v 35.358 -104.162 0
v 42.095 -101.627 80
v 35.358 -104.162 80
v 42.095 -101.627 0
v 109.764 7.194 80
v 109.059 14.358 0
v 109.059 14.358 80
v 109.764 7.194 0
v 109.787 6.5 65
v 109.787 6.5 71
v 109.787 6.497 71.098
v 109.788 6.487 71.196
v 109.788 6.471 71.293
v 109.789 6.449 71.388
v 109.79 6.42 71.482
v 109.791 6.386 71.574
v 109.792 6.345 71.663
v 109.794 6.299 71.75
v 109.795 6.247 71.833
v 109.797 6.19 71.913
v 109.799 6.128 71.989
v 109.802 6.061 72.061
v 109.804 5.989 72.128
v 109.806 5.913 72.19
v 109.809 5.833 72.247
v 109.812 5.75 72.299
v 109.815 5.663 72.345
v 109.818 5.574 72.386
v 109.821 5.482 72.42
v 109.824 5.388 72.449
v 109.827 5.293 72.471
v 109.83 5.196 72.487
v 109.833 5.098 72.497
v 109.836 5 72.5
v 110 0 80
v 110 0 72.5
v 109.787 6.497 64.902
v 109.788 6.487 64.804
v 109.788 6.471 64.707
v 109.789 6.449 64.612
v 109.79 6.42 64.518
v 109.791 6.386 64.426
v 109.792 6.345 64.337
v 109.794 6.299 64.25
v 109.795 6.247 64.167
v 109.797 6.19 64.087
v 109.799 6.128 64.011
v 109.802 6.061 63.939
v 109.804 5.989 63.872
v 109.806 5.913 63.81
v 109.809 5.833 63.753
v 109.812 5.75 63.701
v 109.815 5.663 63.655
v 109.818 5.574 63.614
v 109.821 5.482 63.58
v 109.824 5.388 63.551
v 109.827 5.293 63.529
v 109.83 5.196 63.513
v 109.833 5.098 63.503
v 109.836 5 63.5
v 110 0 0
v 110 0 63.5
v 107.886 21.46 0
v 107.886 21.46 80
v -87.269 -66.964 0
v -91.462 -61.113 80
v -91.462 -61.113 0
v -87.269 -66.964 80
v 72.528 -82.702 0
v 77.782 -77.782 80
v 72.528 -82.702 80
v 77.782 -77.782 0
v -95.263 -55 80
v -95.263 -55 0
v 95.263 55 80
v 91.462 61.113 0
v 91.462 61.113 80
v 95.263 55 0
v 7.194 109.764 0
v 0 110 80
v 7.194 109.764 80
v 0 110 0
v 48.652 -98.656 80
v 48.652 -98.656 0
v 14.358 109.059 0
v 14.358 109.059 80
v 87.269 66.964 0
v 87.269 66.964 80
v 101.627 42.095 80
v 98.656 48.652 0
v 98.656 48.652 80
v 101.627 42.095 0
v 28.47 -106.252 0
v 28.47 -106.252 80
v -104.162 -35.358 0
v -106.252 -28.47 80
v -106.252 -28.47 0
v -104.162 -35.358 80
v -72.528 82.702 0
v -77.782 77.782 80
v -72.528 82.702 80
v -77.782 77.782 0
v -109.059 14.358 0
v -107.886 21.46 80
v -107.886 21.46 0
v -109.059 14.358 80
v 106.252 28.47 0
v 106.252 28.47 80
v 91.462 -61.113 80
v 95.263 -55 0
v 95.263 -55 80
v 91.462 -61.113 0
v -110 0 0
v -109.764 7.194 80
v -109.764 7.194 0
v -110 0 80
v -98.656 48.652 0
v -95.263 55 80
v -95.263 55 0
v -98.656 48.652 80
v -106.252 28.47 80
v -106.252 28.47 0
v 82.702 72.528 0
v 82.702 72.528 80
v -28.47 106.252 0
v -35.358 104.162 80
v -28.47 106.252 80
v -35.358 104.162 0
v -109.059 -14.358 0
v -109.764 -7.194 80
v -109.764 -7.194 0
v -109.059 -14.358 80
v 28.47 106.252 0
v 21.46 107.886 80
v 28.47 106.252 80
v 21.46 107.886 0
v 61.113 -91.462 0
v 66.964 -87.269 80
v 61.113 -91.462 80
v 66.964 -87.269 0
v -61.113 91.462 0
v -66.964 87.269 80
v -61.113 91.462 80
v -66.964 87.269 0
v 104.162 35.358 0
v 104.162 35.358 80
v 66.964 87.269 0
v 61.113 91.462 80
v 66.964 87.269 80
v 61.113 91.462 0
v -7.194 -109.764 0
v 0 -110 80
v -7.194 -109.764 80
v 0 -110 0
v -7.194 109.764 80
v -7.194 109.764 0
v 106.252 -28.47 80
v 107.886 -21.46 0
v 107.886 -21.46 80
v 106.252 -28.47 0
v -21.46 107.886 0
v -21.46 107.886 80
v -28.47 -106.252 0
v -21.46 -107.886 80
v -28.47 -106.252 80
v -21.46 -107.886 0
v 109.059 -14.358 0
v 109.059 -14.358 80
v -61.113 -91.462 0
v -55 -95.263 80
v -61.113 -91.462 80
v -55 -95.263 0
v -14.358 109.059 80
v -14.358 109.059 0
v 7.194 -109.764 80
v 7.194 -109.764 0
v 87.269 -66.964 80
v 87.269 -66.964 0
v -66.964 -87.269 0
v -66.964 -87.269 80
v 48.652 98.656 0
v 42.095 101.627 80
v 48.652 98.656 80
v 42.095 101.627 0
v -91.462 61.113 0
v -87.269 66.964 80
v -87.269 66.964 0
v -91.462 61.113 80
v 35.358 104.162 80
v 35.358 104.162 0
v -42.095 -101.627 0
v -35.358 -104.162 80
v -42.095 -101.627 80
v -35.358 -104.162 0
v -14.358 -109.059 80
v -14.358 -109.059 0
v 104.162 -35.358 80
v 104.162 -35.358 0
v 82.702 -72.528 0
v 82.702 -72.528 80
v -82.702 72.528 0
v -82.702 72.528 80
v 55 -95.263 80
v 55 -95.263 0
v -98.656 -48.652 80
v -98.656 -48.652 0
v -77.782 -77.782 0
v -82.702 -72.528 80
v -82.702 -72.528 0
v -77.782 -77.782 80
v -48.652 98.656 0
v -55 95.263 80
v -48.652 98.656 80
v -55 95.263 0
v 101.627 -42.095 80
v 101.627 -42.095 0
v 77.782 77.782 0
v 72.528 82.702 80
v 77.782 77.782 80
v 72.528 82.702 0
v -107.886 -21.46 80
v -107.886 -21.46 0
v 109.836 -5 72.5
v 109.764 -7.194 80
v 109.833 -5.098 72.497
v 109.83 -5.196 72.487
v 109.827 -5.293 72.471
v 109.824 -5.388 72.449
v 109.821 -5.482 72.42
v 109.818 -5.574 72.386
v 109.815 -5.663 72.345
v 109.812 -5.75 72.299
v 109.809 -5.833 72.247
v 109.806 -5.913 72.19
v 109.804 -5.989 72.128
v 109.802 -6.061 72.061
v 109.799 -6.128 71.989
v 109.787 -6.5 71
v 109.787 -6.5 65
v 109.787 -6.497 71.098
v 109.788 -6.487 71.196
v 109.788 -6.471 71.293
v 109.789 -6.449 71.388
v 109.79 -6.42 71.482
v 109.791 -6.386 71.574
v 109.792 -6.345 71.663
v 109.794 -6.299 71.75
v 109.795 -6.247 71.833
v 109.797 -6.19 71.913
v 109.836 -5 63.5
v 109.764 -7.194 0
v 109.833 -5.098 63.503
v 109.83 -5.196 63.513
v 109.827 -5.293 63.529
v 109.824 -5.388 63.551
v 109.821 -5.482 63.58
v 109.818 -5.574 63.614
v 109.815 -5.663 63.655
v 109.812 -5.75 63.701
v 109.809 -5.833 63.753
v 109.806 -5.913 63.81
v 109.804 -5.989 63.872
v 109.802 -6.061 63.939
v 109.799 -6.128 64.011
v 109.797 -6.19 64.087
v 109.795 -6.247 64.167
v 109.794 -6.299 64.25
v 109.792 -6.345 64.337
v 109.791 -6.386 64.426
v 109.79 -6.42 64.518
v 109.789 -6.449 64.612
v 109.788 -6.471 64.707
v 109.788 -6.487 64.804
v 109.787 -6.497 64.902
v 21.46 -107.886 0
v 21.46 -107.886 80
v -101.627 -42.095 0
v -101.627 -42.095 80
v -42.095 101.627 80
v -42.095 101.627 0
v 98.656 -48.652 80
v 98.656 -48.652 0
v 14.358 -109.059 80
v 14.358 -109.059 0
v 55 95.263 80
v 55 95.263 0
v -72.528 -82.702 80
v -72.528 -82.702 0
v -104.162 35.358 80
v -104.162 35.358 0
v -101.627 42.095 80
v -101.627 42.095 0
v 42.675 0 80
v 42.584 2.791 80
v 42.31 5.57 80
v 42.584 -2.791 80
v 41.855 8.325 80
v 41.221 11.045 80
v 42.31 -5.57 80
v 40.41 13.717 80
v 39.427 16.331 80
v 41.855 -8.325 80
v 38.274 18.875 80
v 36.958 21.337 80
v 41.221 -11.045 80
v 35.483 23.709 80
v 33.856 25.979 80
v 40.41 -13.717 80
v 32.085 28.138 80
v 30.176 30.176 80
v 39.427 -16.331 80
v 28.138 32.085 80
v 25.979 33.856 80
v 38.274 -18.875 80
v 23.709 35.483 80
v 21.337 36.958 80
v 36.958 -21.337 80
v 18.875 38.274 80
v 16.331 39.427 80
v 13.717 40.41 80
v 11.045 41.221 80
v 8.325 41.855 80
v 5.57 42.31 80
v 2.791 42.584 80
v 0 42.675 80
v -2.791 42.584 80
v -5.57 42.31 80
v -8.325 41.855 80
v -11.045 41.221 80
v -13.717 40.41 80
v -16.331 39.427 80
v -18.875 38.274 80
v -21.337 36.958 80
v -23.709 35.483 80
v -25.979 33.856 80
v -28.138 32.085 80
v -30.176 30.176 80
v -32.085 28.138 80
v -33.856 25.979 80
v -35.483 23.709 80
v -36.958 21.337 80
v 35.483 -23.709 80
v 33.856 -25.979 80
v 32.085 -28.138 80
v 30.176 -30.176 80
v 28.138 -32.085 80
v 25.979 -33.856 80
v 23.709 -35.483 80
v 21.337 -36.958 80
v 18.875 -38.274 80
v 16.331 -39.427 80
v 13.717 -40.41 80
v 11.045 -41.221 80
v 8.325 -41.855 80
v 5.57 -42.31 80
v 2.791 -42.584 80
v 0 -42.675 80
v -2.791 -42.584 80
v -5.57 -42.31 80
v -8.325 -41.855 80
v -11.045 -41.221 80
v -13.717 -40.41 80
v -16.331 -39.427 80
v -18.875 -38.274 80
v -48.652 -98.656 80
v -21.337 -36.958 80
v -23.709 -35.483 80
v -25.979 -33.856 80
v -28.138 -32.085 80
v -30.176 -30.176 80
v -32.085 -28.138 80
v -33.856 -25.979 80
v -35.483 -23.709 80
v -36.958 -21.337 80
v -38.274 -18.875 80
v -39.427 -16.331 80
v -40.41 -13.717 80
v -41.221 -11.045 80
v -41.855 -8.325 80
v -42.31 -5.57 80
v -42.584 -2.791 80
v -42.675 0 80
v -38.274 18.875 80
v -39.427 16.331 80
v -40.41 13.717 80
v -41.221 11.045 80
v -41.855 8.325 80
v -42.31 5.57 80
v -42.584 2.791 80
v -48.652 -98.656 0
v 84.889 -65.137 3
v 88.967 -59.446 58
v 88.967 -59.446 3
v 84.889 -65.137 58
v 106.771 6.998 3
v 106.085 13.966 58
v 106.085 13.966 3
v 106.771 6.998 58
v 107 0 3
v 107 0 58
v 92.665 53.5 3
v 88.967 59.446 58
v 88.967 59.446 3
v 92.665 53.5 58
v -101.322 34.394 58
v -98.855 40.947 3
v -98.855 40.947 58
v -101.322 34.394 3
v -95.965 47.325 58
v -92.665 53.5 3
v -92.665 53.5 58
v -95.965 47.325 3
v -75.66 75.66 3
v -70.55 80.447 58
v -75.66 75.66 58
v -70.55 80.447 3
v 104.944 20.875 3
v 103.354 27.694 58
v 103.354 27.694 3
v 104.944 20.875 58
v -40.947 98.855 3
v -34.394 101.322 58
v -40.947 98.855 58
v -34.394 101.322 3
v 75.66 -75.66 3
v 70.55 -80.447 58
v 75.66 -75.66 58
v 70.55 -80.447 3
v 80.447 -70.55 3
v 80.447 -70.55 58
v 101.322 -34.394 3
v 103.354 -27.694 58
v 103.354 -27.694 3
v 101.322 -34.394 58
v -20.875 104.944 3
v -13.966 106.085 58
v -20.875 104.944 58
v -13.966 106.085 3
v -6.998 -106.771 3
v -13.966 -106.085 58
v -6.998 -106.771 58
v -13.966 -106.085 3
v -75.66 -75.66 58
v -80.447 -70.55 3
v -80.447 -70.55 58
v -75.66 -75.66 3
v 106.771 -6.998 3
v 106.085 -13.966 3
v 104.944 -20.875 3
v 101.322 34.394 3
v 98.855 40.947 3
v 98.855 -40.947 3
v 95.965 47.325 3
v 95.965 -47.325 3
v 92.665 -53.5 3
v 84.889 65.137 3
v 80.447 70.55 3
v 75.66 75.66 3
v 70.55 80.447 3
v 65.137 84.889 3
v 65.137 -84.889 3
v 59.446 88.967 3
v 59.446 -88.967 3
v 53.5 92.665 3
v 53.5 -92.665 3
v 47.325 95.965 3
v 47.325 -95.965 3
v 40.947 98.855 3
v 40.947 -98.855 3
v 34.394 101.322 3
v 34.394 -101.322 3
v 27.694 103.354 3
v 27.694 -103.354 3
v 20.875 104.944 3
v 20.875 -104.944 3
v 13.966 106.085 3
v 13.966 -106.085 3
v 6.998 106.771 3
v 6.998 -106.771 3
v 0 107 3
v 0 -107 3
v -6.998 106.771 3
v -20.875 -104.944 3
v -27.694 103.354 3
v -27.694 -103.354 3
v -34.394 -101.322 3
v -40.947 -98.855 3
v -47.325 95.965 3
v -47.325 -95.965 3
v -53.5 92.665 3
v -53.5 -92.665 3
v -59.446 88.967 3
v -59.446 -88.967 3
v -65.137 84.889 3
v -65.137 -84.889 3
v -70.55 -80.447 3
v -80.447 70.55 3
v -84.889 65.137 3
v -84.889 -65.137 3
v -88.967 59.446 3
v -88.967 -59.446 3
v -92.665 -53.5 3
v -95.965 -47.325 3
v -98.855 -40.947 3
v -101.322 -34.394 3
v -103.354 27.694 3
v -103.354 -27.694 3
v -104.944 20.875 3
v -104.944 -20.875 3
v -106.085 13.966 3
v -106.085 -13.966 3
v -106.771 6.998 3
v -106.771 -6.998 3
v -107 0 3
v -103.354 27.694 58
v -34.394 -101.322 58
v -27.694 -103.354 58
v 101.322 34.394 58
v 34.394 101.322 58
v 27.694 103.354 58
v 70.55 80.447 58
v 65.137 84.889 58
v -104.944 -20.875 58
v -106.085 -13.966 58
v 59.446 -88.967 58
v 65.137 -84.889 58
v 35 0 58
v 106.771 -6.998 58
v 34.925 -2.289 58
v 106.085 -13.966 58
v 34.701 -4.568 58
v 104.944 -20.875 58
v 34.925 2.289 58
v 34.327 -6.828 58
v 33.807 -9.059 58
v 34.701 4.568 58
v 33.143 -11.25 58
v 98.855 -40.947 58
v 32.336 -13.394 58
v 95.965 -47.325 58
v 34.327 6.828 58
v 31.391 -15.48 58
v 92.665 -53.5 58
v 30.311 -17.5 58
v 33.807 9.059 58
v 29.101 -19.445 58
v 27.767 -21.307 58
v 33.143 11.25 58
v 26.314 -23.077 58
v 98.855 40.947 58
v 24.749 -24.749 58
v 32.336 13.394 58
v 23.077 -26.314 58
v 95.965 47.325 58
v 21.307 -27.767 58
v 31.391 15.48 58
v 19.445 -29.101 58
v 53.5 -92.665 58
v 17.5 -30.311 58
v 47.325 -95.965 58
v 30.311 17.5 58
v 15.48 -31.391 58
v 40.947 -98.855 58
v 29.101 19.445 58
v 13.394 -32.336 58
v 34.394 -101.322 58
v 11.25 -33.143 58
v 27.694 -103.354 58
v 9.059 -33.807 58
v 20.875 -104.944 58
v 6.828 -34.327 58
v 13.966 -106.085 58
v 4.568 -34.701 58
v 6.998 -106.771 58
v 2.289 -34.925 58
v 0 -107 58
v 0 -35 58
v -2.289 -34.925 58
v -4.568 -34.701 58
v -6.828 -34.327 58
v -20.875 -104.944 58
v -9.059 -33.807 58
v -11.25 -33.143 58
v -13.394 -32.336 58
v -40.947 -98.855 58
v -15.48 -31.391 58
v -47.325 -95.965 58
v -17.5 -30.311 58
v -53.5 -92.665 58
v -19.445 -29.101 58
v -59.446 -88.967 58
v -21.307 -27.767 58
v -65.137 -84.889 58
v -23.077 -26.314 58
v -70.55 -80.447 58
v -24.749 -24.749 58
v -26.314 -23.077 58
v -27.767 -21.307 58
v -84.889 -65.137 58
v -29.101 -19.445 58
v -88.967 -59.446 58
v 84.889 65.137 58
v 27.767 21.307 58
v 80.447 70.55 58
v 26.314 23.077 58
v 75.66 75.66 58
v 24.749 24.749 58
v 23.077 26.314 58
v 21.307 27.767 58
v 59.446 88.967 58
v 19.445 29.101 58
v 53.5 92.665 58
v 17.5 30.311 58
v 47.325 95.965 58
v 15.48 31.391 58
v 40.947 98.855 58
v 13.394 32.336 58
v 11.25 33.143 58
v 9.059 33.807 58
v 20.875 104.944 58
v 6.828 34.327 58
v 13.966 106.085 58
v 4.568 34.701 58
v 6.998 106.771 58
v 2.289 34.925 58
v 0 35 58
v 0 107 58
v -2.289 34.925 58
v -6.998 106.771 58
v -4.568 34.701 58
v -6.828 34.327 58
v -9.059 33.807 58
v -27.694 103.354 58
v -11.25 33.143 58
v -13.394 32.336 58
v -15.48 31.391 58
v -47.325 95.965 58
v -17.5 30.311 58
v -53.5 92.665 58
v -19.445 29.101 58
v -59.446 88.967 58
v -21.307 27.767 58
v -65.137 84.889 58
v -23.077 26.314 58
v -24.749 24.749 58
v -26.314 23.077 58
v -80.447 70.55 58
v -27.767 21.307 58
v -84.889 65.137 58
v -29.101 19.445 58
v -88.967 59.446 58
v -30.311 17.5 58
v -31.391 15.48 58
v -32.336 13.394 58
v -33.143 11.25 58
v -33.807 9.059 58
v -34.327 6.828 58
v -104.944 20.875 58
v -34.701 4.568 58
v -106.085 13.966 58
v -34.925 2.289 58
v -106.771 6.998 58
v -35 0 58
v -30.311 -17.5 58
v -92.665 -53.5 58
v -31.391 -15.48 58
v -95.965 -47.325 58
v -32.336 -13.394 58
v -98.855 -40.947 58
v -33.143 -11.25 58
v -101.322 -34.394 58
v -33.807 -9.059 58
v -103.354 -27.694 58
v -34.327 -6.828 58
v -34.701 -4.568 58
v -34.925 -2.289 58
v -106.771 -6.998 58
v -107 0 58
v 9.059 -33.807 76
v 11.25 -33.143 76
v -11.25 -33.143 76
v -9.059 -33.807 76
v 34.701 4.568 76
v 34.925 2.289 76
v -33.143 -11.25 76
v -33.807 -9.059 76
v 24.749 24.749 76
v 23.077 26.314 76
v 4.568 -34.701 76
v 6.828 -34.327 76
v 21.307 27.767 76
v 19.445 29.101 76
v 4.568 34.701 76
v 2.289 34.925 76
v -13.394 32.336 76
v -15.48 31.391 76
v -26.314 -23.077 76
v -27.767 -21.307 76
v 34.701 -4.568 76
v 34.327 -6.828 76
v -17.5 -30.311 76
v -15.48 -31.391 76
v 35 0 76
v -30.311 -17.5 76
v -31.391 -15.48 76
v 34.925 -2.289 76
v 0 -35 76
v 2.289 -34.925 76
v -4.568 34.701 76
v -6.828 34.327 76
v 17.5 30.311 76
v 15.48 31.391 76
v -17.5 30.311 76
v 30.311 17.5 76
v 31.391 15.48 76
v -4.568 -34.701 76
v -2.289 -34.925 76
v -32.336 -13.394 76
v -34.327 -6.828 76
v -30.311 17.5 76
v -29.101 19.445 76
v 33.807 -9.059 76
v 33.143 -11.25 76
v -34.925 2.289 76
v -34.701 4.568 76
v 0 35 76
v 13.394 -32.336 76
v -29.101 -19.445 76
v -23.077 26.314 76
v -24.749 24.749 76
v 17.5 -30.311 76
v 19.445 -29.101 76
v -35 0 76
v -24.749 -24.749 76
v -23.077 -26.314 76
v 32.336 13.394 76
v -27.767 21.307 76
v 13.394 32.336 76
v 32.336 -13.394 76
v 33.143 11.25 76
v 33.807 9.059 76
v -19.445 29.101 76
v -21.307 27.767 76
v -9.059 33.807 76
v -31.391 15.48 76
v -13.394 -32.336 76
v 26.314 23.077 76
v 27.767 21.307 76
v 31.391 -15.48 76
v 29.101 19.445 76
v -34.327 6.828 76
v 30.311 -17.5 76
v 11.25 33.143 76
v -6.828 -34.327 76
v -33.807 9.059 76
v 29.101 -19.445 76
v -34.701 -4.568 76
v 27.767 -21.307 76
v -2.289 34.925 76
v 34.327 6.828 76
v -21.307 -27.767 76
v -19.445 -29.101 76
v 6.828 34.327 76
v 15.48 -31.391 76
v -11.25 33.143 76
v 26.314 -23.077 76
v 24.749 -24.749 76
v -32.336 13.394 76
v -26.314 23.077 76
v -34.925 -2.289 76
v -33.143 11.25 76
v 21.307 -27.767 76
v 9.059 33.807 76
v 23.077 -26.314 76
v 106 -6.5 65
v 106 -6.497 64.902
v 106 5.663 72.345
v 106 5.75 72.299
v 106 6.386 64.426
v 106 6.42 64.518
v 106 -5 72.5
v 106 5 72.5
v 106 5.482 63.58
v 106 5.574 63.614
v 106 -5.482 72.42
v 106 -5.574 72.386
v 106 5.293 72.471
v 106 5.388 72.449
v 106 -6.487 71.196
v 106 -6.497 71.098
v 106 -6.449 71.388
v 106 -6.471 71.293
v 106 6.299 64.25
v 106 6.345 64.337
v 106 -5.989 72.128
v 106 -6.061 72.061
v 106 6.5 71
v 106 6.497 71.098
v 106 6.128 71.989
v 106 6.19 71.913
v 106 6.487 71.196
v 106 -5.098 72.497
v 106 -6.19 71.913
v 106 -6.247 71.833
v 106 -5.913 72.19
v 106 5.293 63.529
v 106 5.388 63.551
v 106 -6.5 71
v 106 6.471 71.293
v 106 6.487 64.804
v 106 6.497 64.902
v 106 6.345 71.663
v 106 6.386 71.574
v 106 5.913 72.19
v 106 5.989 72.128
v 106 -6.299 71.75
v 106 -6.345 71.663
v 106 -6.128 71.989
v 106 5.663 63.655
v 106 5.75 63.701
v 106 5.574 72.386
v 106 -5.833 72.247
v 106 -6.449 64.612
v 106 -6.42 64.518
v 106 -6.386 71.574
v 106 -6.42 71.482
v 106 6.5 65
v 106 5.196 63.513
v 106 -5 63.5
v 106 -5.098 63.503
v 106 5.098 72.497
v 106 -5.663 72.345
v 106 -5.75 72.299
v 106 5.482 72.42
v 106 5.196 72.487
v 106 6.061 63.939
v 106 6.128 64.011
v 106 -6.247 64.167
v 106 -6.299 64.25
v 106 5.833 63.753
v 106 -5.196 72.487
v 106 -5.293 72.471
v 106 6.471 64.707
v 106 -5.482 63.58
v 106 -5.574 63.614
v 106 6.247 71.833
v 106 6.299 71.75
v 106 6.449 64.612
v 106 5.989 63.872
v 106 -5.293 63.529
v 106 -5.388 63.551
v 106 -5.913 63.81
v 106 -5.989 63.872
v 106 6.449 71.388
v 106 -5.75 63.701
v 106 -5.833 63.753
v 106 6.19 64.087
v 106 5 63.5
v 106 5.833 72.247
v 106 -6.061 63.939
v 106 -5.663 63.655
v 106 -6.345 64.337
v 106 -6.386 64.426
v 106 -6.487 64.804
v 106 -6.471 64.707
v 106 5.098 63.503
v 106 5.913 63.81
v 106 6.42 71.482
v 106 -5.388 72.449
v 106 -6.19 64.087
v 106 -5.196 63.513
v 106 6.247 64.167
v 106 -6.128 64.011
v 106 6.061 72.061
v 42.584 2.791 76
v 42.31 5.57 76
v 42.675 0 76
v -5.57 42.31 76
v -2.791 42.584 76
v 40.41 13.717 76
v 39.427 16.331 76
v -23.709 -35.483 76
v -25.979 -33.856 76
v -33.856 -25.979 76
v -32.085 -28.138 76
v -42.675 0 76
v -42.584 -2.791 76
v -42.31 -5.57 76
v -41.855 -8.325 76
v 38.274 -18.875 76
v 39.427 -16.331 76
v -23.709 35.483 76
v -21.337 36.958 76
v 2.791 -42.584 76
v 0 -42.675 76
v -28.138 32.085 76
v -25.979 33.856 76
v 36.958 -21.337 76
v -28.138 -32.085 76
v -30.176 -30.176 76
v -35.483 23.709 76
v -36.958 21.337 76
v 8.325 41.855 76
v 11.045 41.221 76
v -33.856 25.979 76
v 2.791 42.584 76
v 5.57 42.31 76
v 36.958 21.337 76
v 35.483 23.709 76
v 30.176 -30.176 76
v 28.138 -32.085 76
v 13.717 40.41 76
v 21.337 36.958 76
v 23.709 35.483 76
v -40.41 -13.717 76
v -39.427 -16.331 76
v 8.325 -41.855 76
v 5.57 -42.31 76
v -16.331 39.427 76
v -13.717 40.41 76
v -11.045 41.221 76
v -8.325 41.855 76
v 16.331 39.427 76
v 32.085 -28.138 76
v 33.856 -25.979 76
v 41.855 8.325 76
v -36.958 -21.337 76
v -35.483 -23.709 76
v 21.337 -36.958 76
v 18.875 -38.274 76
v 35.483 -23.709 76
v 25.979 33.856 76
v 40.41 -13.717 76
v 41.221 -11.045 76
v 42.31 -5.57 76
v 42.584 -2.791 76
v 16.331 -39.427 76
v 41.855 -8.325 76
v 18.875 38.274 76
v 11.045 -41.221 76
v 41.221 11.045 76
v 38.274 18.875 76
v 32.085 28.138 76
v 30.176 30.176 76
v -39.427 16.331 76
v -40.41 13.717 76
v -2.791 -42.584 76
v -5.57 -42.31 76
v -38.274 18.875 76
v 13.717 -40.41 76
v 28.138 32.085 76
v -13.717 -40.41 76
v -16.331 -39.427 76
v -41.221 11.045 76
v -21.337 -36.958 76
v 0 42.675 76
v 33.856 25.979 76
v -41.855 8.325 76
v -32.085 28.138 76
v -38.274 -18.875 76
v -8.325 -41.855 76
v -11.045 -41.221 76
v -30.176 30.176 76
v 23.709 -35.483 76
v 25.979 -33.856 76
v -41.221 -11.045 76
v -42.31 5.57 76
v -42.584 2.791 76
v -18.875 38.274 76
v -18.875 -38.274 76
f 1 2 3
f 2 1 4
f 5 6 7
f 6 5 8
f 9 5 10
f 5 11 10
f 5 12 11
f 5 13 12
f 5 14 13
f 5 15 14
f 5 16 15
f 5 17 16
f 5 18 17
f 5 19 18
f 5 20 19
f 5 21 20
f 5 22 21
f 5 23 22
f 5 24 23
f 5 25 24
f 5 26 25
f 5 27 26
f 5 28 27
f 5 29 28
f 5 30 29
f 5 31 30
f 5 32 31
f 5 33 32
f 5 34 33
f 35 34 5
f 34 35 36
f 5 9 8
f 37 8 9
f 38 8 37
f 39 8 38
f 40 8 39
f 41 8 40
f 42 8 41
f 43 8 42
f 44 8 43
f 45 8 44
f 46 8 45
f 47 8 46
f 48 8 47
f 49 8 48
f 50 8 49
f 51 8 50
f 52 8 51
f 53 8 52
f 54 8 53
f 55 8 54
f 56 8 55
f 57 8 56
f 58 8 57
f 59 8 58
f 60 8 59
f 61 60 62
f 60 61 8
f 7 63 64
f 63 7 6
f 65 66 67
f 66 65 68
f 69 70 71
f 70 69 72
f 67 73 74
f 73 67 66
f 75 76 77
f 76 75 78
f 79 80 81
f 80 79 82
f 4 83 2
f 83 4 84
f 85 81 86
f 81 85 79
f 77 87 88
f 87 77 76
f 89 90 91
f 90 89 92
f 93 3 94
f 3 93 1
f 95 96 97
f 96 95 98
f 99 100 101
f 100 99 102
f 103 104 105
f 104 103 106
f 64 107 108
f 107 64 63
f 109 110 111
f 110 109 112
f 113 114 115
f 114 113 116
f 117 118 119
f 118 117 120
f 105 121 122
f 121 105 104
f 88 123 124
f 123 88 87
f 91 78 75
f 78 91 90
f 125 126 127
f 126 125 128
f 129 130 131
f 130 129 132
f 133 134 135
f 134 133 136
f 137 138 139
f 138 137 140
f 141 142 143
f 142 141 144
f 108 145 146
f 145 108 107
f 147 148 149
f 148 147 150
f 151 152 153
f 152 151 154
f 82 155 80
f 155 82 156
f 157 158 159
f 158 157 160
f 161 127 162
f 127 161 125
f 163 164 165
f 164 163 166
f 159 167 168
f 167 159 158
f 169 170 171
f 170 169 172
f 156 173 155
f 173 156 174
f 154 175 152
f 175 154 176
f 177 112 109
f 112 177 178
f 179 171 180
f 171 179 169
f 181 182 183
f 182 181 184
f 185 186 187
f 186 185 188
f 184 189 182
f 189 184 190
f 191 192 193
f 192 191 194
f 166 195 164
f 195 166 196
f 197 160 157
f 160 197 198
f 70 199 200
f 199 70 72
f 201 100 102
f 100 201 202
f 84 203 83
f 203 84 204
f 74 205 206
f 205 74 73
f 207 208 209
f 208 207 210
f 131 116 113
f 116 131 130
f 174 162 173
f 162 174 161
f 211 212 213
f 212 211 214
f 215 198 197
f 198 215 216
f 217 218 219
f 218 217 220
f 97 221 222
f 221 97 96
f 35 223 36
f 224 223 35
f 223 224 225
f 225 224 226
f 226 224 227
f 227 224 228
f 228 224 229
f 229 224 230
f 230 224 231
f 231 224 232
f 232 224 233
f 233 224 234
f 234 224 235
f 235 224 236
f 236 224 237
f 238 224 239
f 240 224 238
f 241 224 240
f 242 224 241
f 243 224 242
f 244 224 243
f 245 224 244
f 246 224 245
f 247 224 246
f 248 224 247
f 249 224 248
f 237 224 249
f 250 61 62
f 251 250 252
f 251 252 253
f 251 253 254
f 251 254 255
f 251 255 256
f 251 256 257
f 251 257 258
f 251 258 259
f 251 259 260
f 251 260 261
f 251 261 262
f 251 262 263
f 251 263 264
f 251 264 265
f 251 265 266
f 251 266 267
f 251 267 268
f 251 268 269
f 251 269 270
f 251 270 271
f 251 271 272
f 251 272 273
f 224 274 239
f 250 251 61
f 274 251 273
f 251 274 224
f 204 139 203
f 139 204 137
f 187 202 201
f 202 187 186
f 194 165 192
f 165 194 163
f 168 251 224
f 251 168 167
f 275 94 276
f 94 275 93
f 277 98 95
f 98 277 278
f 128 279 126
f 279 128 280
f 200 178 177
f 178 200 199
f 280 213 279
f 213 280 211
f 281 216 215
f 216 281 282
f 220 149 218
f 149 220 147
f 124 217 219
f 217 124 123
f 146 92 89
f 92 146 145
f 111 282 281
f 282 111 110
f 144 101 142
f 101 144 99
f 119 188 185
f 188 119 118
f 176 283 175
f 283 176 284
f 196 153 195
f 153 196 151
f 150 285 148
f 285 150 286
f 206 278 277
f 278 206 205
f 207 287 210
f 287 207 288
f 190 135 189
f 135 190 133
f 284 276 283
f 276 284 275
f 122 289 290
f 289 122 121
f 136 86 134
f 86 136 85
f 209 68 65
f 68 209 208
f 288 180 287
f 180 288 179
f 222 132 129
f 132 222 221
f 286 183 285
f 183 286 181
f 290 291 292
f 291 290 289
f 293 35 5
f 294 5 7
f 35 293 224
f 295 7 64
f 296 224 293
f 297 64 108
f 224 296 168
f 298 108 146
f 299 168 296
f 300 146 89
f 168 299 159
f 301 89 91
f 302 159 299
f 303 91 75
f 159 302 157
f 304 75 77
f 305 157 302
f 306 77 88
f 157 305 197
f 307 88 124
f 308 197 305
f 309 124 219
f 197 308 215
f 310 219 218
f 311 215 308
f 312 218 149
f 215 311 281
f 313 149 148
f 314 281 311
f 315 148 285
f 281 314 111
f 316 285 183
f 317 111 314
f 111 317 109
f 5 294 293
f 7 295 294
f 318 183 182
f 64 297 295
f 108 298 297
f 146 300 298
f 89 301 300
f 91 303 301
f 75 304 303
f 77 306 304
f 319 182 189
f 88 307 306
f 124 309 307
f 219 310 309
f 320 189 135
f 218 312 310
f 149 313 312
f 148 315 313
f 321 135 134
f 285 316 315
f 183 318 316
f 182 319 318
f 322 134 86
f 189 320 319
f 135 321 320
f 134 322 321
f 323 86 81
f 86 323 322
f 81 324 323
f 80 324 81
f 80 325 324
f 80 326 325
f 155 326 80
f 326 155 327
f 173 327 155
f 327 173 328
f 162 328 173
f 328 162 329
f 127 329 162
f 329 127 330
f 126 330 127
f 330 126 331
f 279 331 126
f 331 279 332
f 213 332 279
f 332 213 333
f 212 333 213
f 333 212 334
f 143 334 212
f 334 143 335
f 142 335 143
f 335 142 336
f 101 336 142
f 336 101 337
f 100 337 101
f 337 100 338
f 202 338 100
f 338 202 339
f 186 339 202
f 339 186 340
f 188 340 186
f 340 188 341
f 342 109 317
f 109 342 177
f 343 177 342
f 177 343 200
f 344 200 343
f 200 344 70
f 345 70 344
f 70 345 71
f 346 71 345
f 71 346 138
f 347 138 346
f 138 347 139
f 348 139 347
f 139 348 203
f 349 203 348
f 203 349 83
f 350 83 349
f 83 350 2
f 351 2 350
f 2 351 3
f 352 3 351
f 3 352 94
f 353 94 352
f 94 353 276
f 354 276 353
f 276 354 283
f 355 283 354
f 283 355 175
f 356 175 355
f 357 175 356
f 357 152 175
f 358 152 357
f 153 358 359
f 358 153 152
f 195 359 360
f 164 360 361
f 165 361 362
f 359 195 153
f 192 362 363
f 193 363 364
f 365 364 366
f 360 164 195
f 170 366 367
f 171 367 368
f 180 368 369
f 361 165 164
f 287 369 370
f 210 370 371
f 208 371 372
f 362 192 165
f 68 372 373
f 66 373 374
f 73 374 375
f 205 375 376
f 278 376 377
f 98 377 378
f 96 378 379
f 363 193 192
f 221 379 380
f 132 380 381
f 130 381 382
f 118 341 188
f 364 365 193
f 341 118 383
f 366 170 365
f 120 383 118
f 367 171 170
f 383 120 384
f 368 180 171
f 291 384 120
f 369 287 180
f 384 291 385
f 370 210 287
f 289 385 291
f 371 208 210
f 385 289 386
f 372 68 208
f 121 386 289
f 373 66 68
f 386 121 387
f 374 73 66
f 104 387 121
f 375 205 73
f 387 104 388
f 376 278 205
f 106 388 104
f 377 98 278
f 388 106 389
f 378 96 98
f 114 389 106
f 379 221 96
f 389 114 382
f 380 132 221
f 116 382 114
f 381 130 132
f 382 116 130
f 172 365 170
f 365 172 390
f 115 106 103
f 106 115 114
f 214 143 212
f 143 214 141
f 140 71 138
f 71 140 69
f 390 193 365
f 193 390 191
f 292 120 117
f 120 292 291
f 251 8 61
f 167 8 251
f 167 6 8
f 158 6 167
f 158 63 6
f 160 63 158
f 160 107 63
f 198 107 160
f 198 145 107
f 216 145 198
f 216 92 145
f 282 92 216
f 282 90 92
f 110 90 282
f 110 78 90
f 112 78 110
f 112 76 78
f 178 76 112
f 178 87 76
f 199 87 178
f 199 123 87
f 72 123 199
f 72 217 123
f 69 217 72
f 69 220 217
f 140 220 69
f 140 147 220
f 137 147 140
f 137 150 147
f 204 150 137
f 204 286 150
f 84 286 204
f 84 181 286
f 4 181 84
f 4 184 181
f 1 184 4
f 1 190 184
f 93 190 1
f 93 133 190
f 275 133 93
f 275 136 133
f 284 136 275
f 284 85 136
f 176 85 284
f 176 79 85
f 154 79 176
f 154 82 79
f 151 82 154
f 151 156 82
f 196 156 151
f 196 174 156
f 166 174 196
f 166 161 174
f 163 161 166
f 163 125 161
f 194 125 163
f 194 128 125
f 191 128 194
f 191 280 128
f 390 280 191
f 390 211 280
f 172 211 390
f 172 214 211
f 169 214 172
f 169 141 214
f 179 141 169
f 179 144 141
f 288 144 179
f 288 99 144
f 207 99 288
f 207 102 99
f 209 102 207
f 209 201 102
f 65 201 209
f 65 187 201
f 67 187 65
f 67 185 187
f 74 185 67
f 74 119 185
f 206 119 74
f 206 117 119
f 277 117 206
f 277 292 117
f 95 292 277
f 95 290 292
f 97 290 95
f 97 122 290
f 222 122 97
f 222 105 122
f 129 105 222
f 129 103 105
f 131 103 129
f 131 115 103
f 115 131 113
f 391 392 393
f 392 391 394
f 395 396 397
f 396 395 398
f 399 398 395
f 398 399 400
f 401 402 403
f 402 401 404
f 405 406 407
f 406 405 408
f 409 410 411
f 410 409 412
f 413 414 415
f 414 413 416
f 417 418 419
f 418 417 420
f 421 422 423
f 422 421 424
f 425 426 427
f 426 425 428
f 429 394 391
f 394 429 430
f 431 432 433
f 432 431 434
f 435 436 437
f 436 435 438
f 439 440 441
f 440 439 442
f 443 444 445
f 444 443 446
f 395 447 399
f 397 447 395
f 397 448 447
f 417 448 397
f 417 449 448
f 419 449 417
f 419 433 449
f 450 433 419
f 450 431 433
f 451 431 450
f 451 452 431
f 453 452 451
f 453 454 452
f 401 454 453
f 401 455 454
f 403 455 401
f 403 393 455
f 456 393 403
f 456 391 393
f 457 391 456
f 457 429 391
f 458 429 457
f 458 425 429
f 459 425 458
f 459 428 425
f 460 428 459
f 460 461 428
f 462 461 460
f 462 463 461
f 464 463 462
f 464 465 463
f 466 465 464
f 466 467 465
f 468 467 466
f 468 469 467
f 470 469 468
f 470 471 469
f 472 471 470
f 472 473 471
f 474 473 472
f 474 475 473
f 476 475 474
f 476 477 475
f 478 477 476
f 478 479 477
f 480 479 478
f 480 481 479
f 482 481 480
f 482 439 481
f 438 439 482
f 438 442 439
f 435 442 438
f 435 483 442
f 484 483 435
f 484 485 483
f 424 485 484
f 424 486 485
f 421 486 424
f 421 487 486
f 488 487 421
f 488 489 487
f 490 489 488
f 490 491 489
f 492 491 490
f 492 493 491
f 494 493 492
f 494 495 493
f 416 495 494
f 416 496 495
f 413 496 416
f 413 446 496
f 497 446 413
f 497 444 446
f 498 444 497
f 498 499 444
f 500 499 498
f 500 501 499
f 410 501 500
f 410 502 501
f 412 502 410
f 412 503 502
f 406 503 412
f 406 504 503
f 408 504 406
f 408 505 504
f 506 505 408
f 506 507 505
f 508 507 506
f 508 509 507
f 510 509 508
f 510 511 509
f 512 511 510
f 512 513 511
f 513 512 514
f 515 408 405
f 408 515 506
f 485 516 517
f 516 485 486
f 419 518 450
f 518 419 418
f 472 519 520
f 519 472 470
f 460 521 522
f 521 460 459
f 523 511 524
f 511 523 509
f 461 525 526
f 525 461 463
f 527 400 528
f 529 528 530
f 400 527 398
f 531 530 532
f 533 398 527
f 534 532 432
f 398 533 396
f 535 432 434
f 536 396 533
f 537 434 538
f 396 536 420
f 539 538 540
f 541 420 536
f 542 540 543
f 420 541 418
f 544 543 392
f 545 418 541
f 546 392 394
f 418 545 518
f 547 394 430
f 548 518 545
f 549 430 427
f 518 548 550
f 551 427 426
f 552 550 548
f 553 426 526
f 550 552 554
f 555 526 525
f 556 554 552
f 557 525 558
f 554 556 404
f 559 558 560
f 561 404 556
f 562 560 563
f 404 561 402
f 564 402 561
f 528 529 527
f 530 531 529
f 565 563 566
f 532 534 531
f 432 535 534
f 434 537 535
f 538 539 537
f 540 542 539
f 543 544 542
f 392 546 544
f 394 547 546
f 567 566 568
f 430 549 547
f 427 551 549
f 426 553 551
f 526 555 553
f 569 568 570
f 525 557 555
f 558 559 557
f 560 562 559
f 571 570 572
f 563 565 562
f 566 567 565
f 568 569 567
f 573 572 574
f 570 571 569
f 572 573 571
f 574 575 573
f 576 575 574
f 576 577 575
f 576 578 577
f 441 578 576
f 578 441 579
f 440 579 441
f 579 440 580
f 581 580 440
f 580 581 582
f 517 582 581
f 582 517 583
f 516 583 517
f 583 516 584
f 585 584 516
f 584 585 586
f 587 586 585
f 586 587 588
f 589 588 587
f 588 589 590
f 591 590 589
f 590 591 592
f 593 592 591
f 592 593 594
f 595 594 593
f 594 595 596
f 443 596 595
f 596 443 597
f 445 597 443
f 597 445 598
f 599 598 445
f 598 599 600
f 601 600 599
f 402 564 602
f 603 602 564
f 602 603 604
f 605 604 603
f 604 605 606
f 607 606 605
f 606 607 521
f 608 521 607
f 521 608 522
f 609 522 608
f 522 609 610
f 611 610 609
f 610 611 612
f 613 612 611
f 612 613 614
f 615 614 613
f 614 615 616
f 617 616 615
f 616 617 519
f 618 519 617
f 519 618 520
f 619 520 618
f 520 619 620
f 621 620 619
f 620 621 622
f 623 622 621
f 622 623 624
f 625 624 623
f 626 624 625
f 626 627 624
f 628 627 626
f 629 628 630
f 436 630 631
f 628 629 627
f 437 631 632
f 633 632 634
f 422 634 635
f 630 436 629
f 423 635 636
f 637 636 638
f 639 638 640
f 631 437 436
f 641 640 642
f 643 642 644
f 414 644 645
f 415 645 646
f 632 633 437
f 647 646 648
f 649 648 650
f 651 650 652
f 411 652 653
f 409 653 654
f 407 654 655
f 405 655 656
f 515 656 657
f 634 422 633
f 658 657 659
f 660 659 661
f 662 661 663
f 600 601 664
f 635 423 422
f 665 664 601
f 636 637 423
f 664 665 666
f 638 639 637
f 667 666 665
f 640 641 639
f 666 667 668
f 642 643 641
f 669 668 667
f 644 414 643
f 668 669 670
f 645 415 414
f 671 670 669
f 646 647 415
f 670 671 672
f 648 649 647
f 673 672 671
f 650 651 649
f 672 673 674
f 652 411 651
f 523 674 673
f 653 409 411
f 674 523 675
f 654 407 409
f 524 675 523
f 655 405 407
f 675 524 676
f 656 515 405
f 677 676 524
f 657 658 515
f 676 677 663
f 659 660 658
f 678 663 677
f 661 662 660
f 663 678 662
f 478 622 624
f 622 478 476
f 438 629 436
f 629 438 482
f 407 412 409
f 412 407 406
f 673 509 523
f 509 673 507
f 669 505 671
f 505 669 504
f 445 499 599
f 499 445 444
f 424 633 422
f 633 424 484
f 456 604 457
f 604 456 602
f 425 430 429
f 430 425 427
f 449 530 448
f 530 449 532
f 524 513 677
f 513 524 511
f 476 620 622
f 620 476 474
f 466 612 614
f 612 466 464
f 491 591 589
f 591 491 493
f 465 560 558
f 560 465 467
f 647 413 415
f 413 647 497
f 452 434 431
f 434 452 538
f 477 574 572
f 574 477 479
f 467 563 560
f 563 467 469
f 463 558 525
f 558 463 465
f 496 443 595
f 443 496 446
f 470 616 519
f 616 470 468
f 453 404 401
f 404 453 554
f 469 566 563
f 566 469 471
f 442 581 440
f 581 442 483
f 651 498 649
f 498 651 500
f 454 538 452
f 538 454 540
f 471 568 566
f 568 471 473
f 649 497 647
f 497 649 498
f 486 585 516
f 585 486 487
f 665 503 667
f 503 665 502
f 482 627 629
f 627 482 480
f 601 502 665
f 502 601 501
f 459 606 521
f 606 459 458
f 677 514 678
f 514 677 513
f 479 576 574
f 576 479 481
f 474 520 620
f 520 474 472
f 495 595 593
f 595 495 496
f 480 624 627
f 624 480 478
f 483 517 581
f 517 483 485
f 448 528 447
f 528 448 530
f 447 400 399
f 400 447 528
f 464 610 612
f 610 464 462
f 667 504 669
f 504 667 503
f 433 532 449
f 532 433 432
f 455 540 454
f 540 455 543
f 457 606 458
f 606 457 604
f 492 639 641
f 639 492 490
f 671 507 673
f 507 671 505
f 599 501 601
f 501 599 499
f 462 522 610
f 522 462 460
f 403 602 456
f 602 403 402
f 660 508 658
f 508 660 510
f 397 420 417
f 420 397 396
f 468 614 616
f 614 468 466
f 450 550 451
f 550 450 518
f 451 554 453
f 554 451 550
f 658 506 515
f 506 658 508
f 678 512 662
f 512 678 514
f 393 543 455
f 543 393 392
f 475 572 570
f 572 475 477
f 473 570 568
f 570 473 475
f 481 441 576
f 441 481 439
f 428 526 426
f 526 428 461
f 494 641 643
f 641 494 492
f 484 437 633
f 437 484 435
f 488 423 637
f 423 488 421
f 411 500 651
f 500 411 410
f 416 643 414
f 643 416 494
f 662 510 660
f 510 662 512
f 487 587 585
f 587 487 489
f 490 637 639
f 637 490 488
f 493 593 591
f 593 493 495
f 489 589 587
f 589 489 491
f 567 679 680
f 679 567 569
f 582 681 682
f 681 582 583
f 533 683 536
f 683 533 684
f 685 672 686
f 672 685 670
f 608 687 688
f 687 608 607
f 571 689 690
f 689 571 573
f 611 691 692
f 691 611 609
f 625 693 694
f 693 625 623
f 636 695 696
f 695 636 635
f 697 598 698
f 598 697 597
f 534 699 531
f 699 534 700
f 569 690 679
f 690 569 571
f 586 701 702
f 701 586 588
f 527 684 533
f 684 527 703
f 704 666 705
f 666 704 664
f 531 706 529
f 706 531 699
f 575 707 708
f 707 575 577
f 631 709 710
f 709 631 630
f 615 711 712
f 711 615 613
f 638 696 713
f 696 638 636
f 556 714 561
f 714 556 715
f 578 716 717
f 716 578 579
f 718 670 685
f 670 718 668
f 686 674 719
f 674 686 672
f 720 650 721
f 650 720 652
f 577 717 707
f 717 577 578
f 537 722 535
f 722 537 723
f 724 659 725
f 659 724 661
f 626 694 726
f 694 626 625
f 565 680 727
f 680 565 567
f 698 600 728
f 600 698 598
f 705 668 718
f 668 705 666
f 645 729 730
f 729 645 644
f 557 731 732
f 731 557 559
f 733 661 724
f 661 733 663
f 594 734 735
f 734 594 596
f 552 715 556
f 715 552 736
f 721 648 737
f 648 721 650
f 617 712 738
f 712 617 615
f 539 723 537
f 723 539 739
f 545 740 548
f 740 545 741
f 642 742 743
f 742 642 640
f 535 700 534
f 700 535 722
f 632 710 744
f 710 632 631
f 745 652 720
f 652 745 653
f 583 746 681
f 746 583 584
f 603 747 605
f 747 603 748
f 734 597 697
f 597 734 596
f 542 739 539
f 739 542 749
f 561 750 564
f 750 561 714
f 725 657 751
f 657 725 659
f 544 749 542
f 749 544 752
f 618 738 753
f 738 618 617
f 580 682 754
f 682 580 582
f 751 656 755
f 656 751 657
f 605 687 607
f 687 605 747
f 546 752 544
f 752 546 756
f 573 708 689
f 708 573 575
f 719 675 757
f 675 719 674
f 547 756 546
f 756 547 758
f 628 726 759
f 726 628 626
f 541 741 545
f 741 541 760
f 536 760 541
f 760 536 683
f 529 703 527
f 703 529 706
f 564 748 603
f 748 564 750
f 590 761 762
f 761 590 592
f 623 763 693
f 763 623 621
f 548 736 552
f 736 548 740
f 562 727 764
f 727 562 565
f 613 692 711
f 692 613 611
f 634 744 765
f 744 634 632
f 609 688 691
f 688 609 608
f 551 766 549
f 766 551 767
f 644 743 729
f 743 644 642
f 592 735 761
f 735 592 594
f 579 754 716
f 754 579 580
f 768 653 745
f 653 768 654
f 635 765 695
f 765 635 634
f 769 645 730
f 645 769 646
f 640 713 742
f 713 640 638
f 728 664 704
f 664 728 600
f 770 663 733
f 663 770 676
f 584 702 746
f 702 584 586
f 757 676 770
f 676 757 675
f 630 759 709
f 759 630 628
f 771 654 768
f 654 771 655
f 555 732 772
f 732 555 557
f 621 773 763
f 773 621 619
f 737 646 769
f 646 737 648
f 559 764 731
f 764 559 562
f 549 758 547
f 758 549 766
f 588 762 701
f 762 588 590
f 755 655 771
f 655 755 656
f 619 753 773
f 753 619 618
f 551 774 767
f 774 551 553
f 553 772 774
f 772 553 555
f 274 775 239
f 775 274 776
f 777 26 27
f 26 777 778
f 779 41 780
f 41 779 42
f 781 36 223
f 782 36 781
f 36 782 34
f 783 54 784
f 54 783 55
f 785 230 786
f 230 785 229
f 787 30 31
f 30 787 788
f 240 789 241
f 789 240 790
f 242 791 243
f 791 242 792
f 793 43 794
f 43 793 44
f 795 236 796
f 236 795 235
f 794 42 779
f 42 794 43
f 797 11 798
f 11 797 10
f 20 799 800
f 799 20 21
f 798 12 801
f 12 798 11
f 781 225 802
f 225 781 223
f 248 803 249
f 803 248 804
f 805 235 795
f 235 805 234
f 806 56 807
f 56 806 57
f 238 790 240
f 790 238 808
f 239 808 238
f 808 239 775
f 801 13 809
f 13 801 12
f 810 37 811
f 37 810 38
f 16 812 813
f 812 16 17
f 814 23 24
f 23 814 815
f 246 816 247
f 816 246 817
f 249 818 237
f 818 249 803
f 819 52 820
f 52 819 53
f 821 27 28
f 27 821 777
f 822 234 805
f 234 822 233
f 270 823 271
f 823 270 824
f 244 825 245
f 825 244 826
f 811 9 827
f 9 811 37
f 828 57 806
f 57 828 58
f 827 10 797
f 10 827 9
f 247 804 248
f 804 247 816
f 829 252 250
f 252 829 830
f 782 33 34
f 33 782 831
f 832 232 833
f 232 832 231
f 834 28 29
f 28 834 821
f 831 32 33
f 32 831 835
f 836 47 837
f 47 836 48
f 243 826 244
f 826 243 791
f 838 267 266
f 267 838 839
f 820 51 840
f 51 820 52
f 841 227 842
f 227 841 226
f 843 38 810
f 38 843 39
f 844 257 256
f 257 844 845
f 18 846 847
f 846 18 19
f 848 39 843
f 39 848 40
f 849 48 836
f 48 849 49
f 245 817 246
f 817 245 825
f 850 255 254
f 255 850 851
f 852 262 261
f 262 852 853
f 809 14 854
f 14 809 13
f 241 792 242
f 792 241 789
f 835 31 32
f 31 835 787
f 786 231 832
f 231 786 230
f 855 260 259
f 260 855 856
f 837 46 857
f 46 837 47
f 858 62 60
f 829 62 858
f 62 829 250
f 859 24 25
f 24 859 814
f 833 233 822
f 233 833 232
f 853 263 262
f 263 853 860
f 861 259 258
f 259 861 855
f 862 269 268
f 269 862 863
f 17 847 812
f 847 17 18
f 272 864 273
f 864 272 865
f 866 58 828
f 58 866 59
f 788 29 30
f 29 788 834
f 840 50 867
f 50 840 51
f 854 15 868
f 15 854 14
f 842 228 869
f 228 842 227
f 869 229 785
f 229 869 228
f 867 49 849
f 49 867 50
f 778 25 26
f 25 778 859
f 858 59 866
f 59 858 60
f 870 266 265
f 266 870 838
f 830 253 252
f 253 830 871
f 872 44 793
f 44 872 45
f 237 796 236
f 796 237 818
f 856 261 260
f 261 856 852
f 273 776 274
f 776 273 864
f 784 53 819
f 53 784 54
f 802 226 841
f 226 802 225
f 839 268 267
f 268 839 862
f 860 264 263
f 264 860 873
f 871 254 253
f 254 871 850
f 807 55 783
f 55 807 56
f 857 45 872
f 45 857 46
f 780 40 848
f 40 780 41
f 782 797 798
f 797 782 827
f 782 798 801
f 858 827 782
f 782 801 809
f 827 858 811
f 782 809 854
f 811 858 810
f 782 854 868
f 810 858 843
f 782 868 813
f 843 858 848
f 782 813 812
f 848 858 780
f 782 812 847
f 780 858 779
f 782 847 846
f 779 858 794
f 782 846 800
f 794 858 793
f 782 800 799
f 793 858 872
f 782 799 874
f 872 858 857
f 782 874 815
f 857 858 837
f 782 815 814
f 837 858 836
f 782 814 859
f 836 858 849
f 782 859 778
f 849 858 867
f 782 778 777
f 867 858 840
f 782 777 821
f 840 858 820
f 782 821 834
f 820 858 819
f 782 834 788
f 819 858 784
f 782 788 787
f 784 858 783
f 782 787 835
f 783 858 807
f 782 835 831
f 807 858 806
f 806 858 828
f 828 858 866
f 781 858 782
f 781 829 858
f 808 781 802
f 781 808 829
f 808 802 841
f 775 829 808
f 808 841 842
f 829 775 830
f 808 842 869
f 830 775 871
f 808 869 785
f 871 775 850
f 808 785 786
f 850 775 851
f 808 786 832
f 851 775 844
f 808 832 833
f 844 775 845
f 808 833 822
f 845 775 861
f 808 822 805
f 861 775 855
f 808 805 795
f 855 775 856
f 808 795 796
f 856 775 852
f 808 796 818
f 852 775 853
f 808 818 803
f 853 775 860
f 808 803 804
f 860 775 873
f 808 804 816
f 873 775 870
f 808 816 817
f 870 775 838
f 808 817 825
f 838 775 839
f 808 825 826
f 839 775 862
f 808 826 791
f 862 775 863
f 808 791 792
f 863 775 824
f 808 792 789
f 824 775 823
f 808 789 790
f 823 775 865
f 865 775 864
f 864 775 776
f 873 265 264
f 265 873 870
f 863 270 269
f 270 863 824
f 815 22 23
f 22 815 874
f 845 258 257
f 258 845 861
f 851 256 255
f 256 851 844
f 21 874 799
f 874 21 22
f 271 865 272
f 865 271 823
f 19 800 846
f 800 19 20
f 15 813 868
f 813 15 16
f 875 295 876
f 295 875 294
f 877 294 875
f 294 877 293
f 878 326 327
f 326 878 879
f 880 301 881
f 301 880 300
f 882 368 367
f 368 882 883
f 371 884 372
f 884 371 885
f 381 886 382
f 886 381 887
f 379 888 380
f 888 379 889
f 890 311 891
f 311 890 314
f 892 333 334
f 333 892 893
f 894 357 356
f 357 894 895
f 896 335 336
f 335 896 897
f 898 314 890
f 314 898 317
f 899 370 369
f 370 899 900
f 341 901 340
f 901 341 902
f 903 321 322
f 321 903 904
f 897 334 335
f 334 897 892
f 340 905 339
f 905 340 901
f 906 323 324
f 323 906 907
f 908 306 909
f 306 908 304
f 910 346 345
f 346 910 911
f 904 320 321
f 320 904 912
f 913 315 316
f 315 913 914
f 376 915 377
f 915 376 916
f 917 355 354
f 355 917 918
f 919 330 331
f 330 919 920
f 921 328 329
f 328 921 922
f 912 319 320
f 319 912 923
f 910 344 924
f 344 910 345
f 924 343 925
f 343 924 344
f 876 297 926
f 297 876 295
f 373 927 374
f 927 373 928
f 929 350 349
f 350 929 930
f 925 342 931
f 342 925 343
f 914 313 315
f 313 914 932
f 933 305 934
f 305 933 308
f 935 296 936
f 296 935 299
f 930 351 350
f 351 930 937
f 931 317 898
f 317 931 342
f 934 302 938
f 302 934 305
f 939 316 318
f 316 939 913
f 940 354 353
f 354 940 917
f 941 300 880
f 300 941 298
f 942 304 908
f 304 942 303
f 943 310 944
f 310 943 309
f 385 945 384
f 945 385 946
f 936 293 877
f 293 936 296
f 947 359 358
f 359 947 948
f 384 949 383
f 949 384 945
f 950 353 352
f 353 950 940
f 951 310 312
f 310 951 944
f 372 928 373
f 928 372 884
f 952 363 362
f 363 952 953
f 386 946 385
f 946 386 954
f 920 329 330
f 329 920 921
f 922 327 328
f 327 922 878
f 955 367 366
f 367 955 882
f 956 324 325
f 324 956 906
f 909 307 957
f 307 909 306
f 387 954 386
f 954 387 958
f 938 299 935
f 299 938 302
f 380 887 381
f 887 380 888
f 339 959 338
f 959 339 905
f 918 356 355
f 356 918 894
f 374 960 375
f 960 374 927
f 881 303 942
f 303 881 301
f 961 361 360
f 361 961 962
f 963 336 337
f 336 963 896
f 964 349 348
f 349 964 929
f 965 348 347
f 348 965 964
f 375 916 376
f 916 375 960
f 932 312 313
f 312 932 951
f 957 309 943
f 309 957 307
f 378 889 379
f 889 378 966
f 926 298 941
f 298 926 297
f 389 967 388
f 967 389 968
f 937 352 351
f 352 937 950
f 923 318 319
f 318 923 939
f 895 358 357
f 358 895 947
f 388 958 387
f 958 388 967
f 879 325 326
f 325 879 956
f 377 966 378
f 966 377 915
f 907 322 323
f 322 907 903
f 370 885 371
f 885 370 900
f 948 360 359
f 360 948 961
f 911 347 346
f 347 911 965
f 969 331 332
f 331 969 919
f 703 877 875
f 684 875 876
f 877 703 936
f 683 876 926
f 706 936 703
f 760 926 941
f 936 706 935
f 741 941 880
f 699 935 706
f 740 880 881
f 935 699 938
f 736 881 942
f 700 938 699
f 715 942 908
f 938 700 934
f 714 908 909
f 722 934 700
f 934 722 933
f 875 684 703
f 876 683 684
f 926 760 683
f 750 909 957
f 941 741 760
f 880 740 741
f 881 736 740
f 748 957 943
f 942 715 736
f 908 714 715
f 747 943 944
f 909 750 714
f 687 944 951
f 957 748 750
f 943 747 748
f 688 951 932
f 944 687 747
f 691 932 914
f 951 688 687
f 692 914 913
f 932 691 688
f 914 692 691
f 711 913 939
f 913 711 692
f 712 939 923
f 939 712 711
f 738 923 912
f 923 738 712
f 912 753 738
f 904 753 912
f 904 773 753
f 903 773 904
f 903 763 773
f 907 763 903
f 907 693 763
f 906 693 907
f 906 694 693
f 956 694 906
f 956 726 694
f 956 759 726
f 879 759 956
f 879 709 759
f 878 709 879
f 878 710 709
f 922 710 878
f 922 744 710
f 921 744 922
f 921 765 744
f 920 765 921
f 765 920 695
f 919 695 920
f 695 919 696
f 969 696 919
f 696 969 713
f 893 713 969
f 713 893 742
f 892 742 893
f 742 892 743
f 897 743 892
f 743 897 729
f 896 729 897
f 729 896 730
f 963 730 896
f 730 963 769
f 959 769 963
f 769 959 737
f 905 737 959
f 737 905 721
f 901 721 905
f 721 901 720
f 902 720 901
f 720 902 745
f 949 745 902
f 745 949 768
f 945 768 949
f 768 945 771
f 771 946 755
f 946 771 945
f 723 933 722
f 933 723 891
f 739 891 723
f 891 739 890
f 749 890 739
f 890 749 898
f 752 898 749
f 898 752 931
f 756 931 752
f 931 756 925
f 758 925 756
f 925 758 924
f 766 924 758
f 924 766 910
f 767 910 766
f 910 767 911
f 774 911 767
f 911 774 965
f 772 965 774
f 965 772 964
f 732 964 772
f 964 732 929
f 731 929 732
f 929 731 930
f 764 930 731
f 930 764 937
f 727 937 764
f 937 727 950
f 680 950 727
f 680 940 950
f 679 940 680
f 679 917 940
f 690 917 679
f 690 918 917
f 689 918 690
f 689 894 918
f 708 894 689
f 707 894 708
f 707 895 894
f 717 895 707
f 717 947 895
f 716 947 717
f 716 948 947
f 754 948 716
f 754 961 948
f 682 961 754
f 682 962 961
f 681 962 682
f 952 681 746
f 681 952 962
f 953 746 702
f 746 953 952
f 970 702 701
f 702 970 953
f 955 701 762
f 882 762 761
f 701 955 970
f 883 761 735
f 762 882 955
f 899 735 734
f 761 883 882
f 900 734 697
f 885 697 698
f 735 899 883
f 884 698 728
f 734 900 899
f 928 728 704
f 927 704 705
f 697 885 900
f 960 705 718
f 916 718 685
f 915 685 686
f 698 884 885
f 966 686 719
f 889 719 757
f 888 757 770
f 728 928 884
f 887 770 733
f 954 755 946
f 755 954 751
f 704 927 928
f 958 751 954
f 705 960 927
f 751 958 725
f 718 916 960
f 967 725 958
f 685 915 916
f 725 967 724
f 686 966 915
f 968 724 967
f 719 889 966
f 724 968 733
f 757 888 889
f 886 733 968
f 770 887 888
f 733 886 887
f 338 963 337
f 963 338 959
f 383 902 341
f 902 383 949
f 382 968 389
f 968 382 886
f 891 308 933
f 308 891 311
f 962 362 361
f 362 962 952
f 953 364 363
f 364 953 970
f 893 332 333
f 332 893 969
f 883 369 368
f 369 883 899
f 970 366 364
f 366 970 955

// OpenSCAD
// Decibel Light Meter — parametric tower + weighted base
// Target printer: Bambu D2X. Default segment height (220mm) is a safe bet for
// most Bambu beds — bump SEGMENT_H up if your D2X's Z height is larger.
//
// Render one part at a time: set PART below, then F6 -> export STL.
// PART = "base" | "segment" | "cap" | "diffuser"

PART = "base";

// ---- Global tower parameters ----
OUTER_D     = 90;     // outer diameter of the tower, mm
WALL        = 2.4;    // wall thickness, mm (6 perimeters at 0.4mm line width)
TOTAL_H     = 1000;   // total tower height target, mm
SEGMENT_H   = 220;    // printable segment height, mm (fits most beds w/ margin)
WINDOW_W    = 50;     // width of the LED diffusion window per segment
WINDOW_INSET= 4;      // how far the window recesses into the wall, for diffuser to sit in
JOINT_D     = 4;       // depth of the stacking lap joint
JOINT_CLEAR = 0.15;    // clearance for the lap joint fit
ROD_D       = 8.5;     // center hole for M8 threaded rod (structural spine)
$fn = 96;

// ---- Base parameters ----
BASE_D        = 220;
BASE_H        = 80;
BASE_WALL     = 3.0;
WEIGHT_CAVITY_H = 55;   // fill with sand/lead shot/epoxy for ballast
ELEC_BAY_D    = 70;     // electronics bay diameter (mic, ESP32, battery/USB)
ELEC_BAY_H    = 20;
MIC_HOLE_D    = 6;      // sound port to mic capsule
USBC_SLOT_W   = 10;
USBC_SLOT_H   = 6;

module tower_outer(h) {
    cylinder(d = OUTER_D, h = h);
}

module tower_hollow(h) {
    translate([0,0,-1])
        cylinder(d = OUTER_D - 2*WALL, h = h + 2);
}

module led_window(h) {
    // vertical slot facing +Y, recessed for a diffuser strip to clip into
    translate([0, OUTER_D/2 - WINDOW_INSET, h/2])
        rotate([90,0,0])
        linear_extrude(height = WINDOW_INSET + WALL + 1)
            offset(r=2) square([WINDOW_W - 4, h - 30], center = true);
}

module rod_channel(h) {
    translate([0,0,-1]) cylinder(d = ROD_D, h = h + 2);
}

module lap_joint_male(h) {
    // protrusion on top of a segment that plugs into the next segment's socket
    translate([0,0,h])
        cylinder(d = OUTER_D - 2*WALL - JOINT_CLEAR, h = JOINT_D);
}

module lap_joint_female() {
    translate([0,0,-1])
        cylinder(d = OUTER_D - 2*WALL + JOINT_CLEAR, h = JOINT_D + 1);
}

module segment(h = SEGMENT_H, bottom_socket = true, top_plug = true) {
    difference() {
        union() {
            cylinder(d = OUTER_D, h = h);
            if (top_plug) lap_joint_male(h);
        }
        tower_hollow(h);
        led_window(h);
        rod_channel(h + JOINT_D);
        if (bottom_socket) lap_joint_female();
    }
}

module cap() {
    // top cap, frosted/solid — print in white/translucent PETG for diffusion
    difference() {
        union() {
            cylinder(d = OUTER_D, h = 8);
            cylinder(d = OUTER_D - 6, h = 18);
        }
        translate([0,0,-1]) cylinder(d = ROD_D + 1, h = 10); // rod nut pocket
        lap_joint_female();
    }
}

module diffuser_strip(h = SEGMENT_H - 30) {
    // thin frosted insert that clips into the window cutout; print separately
    // in white/translucent PETG, 0.6mm walls, no infill.
    difference() {
        cube([WINDOW_W - 4, 1.2, h], center = true);
    }
}

module base() {
    difference() {
        union() {
            cylinder(d = BASE_D, h = BASE_H);
        }
        // ballast cavity (fill with sand/shot after printing, then cap)
        translate([0,0,BASE_WALL])
            cylinder(d = BASE_D - 2*BASE_WALL, h = WEIGHT_CAVITY_H);
        // electronics bay, raised above ballast
        translate([0,0,WEIGHT_CAVITY_H + BASE_WALL])
            cylinder(d = ELEC_BAY_D, h = ELEC_BAY_H + 1);
        // mic sound port straight up to where the tower base sits
        translate([0,0,BASE_H - 5]) cylinder(d = MIC_HOLE_D, h = 10);
        // USB-C access slot on the side, at electronics bay height
        translate([BASE_D/2 - BASE_WALL - 1, 0, WEIGHT_CAVITY_H + BASE_WALL + ELEC_BAY_H/2])
            rotate([0,90,0])
            linear_extrude(height = BASE_WALL + 2)
                offset(r=1.5) square([USBC_SLOT_H, USBC_SLOT_W], center = true);
        // rod anchor hole at center, threads into a heat-set insert
        translate([0,0,BASE_H - 12]) cylinder(d = ROD_D, h = 14);
        // socket for first tower segment to seat into
        translate([0,0,BASE_H - JOINT_D])
            cylinder(d = OUTER_D - 2*WALL + JOINT_CLEAR, h = JOINT_D + 1);
    }
}

// ---- render selection ----
if (PART == "base") base();
else if (PART == "segment") segment();
else if (PART == "cap") cap();
else if (PART == "diffuser") diffuser_strip();
